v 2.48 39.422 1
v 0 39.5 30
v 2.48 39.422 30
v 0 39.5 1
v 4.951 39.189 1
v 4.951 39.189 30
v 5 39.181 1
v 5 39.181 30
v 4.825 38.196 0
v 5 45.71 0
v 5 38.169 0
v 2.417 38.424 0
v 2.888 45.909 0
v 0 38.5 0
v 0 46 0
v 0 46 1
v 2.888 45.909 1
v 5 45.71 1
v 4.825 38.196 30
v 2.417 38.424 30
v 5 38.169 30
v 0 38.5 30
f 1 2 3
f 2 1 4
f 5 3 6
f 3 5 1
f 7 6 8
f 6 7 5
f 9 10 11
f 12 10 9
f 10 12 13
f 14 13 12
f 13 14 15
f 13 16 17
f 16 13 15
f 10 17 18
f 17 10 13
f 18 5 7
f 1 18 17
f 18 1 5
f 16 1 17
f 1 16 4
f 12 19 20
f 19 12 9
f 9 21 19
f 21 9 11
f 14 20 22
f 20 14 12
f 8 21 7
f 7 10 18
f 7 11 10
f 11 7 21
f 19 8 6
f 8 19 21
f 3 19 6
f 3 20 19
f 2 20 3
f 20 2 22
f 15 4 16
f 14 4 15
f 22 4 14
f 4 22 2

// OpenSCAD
$fn=100;

intersection(){
difference(){
    union(){
        cylinder(50, 77/2+1, 77/2+1);
        cylinder(1, 77/2+7.5, 77/2+7.5);
    }
cylinder(100, 77/2, 77/2);
    
}

cube([5, 100, 30]);
}
